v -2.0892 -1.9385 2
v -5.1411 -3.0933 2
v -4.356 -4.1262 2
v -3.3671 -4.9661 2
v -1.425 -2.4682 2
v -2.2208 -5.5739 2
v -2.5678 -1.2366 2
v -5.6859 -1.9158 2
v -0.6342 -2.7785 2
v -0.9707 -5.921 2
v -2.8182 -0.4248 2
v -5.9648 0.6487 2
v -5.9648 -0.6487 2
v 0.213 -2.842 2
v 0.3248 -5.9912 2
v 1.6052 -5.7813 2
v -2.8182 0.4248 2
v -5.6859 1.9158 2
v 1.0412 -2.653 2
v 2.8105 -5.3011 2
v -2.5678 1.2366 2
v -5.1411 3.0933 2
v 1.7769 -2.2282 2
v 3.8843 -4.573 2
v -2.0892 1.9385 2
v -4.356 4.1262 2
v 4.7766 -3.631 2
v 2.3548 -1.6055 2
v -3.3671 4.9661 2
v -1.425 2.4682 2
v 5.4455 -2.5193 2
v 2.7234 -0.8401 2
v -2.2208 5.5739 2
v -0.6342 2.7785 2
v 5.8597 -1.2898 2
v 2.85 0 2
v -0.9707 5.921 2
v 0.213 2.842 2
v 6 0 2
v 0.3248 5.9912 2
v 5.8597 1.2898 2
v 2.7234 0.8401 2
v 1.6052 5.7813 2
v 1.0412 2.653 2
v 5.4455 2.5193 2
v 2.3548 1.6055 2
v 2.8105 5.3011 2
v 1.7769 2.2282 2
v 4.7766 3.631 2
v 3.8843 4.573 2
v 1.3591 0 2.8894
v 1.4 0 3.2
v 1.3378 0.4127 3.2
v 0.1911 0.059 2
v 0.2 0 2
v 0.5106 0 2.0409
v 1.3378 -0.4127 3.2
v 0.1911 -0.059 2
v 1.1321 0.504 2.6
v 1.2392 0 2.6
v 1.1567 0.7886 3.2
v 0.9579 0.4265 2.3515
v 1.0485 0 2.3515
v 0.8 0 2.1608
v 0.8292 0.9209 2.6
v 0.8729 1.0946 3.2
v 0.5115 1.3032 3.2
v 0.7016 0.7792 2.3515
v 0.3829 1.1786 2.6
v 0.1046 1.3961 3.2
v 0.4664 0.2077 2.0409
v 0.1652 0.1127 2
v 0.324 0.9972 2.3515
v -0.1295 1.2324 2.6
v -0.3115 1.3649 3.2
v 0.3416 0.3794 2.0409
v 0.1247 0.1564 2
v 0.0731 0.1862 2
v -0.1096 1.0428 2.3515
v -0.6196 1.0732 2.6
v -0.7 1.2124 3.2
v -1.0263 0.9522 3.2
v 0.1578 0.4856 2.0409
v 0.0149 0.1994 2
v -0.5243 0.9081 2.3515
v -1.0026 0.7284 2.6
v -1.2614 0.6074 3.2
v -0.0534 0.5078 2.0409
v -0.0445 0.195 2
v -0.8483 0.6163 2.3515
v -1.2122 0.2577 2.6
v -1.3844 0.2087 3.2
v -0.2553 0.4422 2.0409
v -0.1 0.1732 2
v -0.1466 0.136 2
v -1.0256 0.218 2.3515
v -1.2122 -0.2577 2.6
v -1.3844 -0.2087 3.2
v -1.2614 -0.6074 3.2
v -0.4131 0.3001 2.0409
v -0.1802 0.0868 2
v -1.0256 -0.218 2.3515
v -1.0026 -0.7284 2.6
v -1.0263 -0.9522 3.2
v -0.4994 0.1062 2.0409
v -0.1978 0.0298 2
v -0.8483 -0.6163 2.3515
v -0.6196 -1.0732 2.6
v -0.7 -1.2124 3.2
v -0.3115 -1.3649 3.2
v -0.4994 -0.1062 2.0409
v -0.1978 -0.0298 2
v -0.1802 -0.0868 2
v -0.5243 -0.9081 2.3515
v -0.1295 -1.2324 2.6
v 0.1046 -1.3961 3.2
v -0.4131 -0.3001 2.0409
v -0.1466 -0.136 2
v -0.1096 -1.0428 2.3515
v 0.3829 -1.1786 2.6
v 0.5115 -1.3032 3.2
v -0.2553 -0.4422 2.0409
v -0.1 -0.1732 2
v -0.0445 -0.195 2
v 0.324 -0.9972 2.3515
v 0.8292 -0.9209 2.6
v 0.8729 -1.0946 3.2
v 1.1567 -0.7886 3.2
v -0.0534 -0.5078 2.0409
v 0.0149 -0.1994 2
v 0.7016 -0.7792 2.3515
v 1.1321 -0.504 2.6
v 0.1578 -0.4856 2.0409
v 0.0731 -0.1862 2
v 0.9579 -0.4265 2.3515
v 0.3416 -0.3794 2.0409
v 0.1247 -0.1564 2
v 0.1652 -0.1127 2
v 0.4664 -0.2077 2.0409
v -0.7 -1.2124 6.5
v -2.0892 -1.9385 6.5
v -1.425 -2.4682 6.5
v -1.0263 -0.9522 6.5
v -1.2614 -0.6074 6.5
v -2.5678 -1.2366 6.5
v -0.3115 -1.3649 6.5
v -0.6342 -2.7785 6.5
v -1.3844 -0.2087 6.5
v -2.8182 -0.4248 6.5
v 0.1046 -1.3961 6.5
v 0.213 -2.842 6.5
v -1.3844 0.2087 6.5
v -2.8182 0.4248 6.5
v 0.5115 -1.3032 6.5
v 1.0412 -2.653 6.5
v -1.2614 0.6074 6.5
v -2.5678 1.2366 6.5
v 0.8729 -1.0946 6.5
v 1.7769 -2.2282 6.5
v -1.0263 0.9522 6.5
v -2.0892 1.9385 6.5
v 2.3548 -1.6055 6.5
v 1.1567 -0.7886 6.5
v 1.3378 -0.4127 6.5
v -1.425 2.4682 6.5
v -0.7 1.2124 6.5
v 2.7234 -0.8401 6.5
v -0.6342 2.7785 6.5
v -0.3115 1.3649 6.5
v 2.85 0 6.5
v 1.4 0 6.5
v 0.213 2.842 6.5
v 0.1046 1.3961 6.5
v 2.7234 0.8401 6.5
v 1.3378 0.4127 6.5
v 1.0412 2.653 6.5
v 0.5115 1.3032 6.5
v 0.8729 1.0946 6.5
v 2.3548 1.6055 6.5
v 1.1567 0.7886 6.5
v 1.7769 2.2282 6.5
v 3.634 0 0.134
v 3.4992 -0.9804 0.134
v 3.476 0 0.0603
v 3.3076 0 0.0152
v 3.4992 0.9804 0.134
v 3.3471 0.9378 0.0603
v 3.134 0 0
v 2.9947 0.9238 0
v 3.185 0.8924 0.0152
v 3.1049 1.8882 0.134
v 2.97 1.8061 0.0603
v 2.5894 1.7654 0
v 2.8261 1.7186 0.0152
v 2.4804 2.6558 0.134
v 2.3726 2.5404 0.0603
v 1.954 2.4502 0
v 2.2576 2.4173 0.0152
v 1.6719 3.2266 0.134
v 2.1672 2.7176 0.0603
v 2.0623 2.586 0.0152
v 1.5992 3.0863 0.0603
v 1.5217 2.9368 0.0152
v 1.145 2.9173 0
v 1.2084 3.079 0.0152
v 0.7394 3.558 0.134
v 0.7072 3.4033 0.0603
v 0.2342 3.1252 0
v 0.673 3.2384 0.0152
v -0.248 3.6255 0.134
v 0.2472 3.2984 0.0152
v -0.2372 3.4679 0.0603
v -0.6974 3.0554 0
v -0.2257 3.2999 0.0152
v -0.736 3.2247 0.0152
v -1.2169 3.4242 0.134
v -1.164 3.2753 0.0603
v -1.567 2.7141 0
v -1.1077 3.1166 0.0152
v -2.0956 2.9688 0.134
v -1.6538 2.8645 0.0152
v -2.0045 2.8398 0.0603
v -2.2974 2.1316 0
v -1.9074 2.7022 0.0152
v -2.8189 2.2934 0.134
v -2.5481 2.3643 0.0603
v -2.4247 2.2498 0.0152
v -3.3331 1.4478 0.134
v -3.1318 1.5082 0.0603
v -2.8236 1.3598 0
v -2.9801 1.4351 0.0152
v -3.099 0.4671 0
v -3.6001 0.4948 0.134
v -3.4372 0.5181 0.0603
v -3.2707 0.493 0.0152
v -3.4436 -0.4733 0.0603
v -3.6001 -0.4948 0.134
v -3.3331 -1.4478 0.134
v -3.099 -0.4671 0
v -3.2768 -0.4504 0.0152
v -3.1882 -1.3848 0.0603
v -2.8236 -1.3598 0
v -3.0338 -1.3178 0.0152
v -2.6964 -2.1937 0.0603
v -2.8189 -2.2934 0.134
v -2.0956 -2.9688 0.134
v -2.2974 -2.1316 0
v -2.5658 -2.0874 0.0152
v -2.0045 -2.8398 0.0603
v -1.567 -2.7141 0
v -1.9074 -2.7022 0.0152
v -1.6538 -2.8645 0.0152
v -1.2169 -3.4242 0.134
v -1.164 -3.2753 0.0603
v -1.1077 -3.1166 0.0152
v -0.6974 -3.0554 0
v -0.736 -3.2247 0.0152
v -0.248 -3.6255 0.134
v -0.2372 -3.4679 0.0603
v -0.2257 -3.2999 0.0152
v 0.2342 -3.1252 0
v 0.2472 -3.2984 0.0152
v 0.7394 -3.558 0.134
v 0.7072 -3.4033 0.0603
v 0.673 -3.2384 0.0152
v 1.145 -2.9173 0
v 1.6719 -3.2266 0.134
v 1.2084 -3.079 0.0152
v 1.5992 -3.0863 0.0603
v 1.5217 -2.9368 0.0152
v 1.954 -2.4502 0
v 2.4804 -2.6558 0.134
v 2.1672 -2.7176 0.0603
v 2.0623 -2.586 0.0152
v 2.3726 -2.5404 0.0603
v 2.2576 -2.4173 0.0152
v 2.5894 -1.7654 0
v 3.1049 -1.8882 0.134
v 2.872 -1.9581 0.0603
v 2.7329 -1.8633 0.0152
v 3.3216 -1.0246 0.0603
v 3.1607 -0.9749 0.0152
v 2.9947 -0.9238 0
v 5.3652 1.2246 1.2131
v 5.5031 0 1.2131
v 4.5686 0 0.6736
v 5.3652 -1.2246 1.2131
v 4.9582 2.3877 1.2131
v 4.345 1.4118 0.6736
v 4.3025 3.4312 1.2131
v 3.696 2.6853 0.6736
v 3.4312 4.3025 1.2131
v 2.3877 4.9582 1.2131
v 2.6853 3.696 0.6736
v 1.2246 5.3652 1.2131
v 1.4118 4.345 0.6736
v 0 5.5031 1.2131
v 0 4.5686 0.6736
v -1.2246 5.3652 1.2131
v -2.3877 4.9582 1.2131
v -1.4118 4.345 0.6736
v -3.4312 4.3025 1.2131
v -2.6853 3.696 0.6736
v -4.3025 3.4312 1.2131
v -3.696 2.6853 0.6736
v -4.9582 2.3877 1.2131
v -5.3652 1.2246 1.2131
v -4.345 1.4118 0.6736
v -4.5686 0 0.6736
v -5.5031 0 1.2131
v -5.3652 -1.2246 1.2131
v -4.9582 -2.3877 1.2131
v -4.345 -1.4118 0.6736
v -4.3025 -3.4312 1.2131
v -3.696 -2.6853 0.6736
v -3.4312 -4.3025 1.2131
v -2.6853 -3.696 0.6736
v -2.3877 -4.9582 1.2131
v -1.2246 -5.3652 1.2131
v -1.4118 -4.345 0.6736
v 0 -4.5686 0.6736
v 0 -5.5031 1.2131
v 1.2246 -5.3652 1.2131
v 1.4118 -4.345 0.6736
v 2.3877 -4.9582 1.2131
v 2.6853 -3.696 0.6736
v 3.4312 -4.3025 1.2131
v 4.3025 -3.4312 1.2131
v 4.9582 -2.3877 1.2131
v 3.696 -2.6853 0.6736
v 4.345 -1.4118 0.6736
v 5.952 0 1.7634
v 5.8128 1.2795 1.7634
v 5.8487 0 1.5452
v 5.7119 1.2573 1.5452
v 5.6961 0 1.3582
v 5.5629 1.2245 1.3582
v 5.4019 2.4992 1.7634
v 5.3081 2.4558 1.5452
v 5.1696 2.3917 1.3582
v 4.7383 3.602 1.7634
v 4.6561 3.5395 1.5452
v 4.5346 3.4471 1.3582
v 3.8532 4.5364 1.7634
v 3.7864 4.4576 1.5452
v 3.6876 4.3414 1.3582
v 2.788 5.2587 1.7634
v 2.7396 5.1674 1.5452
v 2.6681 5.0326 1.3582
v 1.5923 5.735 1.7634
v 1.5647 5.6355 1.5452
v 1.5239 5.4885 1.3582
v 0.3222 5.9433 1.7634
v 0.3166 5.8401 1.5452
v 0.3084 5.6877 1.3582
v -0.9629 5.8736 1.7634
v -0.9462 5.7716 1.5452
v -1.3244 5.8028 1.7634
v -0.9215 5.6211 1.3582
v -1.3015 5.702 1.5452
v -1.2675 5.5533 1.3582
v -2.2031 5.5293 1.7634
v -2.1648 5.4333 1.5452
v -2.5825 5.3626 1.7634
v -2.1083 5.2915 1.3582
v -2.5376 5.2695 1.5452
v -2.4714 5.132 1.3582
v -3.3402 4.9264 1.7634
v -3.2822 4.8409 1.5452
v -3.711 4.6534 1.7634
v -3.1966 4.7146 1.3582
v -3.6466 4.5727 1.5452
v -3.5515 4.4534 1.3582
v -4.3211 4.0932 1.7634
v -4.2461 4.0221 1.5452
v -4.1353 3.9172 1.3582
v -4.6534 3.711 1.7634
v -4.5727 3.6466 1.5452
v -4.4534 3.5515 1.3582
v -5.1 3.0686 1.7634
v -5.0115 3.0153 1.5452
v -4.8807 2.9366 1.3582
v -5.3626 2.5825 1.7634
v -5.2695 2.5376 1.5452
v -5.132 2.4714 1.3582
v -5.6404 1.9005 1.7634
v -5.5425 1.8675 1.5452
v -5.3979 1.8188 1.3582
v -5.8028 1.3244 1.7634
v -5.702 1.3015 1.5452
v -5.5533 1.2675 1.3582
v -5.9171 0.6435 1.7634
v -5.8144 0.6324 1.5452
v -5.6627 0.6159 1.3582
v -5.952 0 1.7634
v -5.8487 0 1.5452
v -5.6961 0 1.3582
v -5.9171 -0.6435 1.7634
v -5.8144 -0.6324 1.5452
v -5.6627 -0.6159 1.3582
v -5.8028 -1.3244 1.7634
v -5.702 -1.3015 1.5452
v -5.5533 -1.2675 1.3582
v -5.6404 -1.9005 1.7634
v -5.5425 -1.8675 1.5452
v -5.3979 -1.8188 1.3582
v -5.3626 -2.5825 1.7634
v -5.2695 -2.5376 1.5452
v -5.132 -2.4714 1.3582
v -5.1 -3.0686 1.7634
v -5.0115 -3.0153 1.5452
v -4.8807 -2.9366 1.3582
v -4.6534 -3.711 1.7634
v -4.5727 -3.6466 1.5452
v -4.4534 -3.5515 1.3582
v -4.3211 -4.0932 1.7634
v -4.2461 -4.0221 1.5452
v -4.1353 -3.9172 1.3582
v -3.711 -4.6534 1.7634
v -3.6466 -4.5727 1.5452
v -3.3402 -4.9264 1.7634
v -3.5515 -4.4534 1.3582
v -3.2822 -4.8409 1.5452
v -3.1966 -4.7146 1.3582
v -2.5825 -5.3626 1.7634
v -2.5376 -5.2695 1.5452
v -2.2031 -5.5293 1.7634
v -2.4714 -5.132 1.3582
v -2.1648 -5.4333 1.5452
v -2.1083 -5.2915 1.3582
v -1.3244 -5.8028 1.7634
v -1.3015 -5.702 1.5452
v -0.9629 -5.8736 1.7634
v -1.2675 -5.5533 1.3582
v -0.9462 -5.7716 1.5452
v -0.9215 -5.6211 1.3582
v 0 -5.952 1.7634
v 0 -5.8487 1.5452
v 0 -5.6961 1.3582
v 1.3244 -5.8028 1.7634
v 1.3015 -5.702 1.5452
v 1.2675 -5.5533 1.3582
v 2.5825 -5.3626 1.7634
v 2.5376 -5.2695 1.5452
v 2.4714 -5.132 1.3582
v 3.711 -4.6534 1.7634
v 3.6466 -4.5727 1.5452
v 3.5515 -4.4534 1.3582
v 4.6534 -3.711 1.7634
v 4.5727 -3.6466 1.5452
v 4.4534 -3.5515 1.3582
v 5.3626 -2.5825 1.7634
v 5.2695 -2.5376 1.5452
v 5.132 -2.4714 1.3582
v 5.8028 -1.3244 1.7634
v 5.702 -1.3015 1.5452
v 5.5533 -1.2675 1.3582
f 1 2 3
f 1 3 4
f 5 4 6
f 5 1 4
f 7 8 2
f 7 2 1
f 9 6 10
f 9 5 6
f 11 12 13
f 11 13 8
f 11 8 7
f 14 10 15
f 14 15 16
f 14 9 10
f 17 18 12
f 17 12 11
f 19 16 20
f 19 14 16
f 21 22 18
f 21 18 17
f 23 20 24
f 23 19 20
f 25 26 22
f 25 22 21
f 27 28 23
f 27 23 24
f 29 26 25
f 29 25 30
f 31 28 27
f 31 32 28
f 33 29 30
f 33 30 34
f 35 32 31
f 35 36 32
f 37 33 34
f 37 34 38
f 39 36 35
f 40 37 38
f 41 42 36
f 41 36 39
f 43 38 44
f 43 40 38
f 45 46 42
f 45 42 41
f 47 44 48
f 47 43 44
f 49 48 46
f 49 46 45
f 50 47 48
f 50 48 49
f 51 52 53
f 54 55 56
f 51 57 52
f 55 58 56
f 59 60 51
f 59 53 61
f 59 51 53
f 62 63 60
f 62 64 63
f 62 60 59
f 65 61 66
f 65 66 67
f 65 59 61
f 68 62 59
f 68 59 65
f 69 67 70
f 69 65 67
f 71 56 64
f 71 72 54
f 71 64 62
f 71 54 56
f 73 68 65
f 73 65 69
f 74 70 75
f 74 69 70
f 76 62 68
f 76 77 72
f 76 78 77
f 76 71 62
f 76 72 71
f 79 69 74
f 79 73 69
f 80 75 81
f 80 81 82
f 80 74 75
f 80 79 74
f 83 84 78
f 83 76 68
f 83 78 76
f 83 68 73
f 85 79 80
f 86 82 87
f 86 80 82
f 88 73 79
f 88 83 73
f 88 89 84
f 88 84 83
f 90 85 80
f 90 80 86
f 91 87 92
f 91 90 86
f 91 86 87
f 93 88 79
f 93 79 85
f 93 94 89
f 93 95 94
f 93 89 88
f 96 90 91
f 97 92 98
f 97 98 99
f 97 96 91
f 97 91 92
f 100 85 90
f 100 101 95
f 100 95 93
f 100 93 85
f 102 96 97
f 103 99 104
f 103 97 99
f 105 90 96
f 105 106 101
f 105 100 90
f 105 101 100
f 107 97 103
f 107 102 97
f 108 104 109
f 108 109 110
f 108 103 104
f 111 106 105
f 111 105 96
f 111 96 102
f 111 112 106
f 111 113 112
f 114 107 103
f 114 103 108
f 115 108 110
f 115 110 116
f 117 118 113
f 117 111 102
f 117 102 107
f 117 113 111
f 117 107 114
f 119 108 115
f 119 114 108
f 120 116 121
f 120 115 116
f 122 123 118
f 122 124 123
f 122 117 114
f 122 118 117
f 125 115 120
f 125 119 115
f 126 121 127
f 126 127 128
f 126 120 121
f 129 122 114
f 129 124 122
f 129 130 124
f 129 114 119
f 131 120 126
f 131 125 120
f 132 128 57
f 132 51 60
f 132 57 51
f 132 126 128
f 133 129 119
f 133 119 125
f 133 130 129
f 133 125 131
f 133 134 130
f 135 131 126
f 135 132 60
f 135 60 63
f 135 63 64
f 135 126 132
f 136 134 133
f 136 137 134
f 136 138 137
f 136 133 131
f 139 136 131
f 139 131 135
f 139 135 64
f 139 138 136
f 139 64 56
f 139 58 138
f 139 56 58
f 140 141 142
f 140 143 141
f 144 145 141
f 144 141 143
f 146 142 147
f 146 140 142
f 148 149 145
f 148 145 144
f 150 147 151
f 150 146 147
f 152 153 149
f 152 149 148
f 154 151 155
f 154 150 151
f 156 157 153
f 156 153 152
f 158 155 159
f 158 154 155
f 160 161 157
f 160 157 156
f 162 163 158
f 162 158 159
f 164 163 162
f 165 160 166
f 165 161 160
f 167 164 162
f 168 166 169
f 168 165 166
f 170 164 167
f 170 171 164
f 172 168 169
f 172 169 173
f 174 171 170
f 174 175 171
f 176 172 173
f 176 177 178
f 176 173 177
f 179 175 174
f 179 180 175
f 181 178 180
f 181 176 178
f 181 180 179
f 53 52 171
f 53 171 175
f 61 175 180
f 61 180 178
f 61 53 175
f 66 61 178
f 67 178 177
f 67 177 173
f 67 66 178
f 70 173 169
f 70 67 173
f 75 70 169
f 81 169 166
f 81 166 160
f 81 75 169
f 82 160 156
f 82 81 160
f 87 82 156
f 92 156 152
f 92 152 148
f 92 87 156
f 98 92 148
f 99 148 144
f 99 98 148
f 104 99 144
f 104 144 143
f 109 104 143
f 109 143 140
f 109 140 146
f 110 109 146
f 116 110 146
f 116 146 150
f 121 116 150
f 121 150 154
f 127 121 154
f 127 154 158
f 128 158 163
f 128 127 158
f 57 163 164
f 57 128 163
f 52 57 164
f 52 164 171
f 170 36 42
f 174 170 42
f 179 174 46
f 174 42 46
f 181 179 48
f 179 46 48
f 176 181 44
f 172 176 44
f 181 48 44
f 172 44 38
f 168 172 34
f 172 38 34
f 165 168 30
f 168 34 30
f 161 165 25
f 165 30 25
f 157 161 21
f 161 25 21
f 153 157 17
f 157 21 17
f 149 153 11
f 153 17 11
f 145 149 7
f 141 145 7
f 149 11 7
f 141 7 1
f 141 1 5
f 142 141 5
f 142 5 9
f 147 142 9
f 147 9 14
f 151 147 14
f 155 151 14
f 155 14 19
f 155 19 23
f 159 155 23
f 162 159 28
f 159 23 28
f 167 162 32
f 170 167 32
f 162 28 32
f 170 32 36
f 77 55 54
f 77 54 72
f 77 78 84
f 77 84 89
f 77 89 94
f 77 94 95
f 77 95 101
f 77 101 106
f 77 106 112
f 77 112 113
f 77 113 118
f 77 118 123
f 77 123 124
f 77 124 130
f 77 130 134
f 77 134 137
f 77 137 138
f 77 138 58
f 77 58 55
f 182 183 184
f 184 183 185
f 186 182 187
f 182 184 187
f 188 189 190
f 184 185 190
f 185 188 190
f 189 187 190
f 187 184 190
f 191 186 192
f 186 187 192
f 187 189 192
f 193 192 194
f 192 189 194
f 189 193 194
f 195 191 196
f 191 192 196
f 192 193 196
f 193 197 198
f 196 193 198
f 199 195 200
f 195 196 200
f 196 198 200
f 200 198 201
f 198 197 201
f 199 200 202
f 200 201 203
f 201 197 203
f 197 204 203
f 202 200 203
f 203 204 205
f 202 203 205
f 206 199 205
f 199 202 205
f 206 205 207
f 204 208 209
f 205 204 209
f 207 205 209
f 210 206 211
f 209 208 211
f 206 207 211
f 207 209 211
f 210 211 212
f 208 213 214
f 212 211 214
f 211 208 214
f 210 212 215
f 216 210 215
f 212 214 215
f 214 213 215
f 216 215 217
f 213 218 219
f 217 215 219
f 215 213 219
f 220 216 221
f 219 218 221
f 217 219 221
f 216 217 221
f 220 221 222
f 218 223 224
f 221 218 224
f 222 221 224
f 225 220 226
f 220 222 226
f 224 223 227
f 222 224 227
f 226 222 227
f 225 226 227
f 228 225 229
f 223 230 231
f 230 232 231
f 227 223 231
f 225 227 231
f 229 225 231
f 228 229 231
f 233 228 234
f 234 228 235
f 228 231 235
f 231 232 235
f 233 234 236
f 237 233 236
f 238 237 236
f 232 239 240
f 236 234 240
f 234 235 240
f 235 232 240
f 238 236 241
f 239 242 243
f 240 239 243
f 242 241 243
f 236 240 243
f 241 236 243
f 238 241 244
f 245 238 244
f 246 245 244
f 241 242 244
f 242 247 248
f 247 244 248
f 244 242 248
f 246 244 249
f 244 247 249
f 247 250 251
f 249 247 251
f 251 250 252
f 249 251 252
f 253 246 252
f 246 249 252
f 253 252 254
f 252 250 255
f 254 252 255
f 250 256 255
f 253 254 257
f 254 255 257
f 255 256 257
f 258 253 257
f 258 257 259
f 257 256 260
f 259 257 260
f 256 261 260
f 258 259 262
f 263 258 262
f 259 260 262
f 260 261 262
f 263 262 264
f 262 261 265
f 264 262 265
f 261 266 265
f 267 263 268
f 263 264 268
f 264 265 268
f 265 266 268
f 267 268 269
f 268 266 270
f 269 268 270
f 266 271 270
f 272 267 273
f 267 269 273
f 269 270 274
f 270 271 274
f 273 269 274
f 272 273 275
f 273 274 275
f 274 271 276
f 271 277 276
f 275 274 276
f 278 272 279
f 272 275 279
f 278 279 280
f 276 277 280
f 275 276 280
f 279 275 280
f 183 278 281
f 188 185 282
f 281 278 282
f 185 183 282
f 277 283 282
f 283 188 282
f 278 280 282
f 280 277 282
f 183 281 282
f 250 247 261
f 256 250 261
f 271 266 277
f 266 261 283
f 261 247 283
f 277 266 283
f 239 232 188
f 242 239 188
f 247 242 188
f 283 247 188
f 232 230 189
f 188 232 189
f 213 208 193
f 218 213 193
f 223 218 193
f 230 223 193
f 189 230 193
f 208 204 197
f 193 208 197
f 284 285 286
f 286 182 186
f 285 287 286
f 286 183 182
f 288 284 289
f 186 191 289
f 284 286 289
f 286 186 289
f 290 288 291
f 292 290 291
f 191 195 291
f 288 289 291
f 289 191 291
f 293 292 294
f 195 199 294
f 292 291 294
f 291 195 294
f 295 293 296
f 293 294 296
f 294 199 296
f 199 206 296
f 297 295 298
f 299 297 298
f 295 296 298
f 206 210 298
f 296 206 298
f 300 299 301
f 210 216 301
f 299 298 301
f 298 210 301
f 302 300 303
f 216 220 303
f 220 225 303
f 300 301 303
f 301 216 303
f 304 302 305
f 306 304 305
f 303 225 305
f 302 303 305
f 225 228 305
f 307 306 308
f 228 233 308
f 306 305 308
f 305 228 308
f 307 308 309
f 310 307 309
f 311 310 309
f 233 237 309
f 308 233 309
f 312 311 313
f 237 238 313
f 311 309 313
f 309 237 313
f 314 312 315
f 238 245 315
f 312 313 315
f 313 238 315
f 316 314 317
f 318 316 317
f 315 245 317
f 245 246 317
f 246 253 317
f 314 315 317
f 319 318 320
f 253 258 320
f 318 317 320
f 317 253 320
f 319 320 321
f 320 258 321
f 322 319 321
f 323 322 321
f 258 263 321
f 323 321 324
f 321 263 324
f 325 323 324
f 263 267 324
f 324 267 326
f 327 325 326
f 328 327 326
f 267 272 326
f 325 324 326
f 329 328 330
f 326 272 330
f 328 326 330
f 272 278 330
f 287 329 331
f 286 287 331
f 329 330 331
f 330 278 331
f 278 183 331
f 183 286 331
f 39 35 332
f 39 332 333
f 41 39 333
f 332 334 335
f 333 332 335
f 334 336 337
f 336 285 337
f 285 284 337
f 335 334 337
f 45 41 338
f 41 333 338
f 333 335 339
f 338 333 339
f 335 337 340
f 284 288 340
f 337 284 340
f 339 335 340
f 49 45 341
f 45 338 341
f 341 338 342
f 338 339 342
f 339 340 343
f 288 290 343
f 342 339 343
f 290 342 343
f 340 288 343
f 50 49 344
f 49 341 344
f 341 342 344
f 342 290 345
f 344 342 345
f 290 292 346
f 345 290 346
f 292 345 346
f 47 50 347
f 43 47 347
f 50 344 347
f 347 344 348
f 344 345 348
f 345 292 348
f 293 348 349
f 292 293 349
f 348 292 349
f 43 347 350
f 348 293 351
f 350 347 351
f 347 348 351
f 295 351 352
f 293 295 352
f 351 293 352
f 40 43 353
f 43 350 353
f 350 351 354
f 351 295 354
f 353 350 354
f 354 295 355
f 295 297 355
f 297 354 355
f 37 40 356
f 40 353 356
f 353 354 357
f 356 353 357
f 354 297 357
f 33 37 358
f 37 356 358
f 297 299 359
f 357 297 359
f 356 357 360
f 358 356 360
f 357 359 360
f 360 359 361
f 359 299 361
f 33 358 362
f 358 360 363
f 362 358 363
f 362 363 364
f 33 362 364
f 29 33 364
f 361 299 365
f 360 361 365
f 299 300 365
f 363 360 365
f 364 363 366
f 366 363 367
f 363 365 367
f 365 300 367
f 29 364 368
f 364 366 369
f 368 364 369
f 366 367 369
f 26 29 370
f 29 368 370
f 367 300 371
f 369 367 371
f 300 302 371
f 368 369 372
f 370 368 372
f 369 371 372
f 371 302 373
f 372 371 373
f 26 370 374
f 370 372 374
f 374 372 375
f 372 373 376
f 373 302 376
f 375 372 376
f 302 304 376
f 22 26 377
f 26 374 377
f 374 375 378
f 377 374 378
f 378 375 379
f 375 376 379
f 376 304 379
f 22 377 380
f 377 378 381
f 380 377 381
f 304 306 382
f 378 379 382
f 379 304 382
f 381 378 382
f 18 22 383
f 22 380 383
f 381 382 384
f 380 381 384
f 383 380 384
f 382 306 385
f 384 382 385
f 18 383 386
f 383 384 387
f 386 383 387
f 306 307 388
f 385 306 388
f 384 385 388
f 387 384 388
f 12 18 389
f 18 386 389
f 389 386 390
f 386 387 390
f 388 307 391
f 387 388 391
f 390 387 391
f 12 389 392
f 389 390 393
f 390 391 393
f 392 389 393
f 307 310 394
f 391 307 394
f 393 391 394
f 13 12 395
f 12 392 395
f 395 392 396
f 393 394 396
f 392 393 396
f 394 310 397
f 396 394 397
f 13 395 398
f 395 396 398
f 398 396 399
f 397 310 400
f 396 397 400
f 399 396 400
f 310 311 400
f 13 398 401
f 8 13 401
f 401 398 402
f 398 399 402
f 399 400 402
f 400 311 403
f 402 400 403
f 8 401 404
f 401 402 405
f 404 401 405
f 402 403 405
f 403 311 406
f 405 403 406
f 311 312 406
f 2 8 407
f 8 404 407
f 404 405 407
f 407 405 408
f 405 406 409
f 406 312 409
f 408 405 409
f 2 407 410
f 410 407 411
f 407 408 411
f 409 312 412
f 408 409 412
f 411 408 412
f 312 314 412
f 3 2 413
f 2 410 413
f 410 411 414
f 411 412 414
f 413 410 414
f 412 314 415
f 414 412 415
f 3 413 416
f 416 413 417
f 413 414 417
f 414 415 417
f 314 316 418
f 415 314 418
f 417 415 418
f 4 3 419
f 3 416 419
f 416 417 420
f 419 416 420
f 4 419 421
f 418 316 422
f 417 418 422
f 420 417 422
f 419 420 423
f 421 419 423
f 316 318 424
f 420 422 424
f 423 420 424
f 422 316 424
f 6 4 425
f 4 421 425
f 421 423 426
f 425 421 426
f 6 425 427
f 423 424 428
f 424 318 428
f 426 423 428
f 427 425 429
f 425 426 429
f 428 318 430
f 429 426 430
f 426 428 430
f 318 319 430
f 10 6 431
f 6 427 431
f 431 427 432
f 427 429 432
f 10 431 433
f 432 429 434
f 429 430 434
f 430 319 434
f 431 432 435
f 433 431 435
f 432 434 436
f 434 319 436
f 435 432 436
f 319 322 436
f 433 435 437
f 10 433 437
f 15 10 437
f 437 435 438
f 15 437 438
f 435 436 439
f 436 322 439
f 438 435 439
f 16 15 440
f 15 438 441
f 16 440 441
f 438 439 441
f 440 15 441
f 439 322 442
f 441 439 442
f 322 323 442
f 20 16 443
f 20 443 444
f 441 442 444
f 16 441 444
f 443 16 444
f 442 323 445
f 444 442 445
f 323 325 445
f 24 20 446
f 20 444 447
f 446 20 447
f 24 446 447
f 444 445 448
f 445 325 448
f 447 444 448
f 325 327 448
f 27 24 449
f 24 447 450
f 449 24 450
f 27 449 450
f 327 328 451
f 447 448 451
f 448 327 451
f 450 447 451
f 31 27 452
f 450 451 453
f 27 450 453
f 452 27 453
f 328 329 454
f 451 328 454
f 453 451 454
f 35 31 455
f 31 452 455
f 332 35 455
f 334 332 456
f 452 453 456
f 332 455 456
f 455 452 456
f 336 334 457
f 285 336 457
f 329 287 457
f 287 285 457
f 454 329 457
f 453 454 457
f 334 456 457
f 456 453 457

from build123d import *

# Parameters (mm, degrees)
F0_R     = 6
F1_DEPTH = 2
F2_SIZE2 = 2.5980762114
F2_SIZE  = 1.5
F4_R     = 2.85
F4_R_2   = 1.4
F5_DEPTH = 4.5
F6_R     = 1.2


# Not quite as in the source:
# - a fillet or chamfer that OpenCascade refuses, or shapes differently, is made with other operations: its cross-section is extruded or revolved along the edge and cut away or added


with BuildPart() as f1:
    # F0 (on Top) → F1 (new body)
    with BuildSketch(Plane.XY):
        Circle(F0_R)
    extrude(amount=F1_DEPTH)

    # F2
    f2_edges = [f1.edges().sort_by_distance(p)[0] for p in [
        (-6, 0, 0),
    ]]
    f2_side = f1.faces().sort_by_distance((-6, 0, 1))[0]
    chamfer(f2_edges, length=F2_SIZE, length2=F2_SIZE2, reference=f2_side)

    # F3: fillet of radius 1 on 2 edges, made by hand

    # F3_s1 → F3_t2 (revolve, cut)
    with BuildSketch(Plane.XZ):
        with BuildLine():
            ThreePointArc((3.6339745962, 0.1339745962), (3.3927936413, 0.0340741737), (3.1339745962, 0))
            Line((3.1339745962, 0), (3.4019237886, 0))
            Line((3.4019237886, 0), (3.6339745962, 0.1339745962))
        make_face()
    revolve(axis=Axis((0, 0, 0), (0, 0, 1)), mode=Mode.SUBTRACT)

    # F3_s3 → F3_t4 (revolve, cut)
    with BuildSketch(Plane.XZ):
        with BuildLine():
            ThreePointArc((6, 2), (5.8486778537, 1.5452494356), (5.5031382462, 1.2131367327))
            Line((5.5031382462, 1.2131367327), (6, 1.5))
            Line((6, 1.5), (6, 2))
        make_face()
    revolve(axis=Axis((0, 0, 1.5), (0, 0, 1)), mode=Mode.SUBTRACT)

    # F4 (on face) → F5 (join)
    with BuildSketch(Plane.XY.offset(2)):
        Circle(F4_R)
        Circle(F4_R_2, mode=Mode.SUBTRACT)
    extrude(amount=F5_DEPTH)

    # F6
    f6_edges = [f1.edges().sort_by_distance(p)[0] for p in [
        (-1.4, 0, 2),
    ]]
    fillet(f6_edges, radius=F6_R)


solid = f1.part
